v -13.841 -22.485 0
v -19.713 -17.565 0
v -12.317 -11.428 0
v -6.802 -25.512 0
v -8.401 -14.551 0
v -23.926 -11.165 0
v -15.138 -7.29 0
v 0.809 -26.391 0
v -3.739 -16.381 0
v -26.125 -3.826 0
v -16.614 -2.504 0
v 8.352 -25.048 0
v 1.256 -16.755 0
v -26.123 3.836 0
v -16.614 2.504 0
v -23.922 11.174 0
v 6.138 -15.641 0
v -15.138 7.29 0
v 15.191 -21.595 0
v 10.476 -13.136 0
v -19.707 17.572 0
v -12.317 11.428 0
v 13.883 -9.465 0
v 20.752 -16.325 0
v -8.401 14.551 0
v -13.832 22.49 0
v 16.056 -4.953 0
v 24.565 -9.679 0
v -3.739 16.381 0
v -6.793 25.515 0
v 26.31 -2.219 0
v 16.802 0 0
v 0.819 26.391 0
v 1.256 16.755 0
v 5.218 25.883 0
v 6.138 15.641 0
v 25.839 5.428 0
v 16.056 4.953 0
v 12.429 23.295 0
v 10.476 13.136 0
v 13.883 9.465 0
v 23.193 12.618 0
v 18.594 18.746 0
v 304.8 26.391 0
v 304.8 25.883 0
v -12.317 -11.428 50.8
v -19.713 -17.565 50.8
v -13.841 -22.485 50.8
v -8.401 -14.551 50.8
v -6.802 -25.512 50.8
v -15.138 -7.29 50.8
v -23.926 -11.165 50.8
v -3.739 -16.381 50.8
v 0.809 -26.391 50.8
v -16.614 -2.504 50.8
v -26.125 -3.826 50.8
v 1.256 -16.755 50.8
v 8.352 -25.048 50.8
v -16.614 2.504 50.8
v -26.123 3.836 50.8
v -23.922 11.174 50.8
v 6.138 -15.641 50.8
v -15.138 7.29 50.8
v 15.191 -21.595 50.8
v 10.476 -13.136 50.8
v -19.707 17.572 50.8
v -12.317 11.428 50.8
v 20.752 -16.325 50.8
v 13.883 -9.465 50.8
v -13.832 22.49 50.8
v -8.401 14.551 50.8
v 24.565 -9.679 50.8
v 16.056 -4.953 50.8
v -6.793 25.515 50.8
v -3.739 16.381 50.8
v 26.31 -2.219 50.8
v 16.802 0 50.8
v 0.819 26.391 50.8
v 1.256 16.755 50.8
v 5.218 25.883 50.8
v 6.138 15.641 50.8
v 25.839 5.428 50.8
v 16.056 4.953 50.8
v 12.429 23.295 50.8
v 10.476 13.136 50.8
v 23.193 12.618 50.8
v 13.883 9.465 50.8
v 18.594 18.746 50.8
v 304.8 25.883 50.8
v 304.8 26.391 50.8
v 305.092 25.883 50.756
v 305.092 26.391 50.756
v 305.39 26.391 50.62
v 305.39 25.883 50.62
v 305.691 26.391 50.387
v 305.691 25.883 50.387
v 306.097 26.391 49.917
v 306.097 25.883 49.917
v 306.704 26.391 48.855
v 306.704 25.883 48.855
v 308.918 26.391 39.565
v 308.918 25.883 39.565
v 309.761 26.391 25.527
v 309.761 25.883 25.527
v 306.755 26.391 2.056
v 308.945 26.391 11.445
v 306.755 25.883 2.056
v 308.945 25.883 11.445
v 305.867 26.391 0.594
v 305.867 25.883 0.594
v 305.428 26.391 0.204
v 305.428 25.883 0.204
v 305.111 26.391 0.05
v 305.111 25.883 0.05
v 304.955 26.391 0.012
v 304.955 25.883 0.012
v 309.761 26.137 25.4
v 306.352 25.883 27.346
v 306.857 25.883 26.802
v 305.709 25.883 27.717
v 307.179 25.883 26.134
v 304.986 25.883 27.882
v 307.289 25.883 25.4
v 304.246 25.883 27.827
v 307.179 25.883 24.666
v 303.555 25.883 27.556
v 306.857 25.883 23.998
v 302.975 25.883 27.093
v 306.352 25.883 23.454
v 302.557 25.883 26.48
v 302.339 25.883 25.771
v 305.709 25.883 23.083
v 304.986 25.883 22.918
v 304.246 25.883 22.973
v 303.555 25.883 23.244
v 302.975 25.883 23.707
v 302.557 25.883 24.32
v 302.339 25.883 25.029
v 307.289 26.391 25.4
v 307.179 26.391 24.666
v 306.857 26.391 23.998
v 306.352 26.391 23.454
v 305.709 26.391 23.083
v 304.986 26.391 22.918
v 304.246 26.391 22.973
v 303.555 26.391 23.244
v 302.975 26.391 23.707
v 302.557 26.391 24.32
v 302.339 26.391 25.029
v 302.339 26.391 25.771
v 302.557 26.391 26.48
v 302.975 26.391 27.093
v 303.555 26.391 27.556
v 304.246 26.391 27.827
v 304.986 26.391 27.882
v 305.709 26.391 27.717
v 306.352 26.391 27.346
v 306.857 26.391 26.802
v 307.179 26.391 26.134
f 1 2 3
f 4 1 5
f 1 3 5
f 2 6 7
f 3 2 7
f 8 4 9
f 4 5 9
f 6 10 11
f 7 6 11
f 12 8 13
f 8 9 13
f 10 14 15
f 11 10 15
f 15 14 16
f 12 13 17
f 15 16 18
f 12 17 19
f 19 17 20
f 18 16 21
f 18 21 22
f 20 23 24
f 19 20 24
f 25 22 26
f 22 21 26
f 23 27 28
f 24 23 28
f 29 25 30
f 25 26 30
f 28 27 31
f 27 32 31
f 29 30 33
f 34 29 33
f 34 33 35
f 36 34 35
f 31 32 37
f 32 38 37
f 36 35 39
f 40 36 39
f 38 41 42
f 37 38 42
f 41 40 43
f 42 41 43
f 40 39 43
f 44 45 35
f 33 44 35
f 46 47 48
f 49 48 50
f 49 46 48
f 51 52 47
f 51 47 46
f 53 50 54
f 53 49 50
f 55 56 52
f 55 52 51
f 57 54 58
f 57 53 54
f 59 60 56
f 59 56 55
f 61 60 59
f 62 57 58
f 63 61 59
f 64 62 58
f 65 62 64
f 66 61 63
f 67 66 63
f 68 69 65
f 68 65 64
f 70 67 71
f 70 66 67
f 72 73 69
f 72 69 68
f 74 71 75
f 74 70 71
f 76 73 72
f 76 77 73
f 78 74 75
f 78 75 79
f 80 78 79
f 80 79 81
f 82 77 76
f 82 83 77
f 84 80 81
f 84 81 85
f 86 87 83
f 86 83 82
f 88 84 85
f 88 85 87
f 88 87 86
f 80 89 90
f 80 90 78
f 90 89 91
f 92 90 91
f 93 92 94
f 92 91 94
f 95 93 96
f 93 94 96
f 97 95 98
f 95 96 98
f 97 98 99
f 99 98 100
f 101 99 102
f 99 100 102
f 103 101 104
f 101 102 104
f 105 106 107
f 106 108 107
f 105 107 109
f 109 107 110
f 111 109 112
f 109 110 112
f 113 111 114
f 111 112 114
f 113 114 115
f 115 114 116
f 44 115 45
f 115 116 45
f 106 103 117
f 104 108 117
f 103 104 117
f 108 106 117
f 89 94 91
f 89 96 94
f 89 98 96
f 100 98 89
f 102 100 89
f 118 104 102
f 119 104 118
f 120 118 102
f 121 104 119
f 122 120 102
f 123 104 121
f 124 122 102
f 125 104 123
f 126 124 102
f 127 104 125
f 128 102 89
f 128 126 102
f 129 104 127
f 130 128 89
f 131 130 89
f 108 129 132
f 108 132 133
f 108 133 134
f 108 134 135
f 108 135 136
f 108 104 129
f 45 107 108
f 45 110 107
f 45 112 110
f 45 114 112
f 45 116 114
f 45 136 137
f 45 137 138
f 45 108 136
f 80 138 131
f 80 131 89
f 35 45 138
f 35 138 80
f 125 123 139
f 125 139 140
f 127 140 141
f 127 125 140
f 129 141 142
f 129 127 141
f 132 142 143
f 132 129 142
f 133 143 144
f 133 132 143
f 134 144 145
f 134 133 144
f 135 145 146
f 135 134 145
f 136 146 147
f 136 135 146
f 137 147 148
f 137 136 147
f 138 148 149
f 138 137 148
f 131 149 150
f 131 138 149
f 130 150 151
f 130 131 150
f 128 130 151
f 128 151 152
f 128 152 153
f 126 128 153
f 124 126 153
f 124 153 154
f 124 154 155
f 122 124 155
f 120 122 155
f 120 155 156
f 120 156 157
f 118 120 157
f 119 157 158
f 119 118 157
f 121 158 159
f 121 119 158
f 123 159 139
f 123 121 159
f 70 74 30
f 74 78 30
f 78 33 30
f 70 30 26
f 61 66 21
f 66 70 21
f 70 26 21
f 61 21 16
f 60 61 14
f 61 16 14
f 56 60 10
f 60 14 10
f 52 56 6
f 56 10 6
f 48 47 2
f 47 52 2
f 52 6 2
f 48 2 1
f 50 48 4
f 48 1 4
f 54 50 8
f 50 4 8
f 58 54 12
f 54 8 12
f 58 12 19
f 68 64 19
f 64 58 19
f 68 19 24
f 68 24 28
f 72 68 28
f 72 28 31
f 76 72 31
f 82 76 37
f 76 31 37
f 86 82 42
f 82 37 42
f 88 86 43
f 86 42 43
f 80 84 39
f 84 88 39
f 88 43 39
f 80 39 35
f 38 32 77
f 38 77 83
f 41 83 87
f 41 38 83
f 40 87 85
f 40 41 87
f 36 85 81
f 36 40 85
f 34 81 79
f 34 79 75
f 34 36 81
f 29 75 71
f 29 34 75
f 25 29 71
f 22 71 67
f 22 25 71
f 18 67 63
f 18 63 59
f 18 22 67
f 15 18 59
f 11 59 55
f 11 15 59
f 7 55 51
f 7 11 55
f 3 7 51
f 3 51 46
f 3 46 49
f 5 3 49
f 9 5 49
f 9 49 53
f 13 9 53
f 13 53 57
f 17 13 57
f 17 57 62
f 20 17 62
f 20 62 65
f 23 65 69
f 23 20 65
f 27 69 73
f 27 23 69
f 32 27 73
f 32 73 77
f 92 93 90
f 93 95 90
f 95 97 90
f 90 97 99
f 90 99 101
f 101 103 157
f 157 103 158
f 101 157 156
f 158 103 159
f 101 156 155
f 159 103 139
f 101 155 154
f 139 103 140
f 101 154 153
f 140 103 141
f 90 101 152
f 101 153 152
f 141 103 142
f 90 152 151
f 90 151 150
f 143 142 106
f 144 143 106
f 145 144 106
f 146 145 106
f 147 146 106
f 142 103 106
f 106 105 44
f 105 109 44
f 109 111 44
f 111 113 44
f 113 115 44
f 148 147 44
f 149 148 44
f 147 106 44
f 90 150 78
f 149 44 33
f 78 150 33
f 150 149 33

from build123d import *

# Parameters (mm, degrees)
SKETCH1_R           = 26.4033
SKETCH1_R_2         = 16.8021
BOSS_EXTRUDE1_DEPTH = 50.8
SKETCH2_R           = 2.4892
BOSS_EXTRUDE2_DEPTH = 0.508


with BuildPart() as part:
    # Sketch1 → Boss-Extrude1 (new body)
    with BuildSketch(Plane.XY):
        Circle(SKETCH1_R)
        Circle(SKETCH1_R_2, mode=Mode.SUBTRACT)
    extrude(amount=BOSS_EXTRUDE1_DEPTH)

    # Sketch2 → Boss-Extrude2 (add)
    with BuildSketch(Plane(origin=(0, 25.8826, 0), x_dir=(1, 0, 0), z_dir=(0, 1, 0))):
        with BuildLine():
            Line((0, -50.8), (0, 0))
            Line((0, 0), (304.8, 0))
            add(Edge.make_bspline(
                [(304.8, -50.8), (309.760765967, -50.8), (309.760765967, -25.4), (309.760765967, 0), (304.8, 0)],
                knots=[3.141592654, 3.141592654, 3.141592654, 4.71238898, 4.71238898, 6.283185307, 6.283185307, 6.283185307], degree=2, weights=[1, 0.707106781, 1, 0.707106781, 1]))
            Line((304.8, -50.8), (0, -50.8))
        make_face()
        with Locations((304.8, -25.4)):
            Circle(SKETCH2_R, mode=Mode.SUBTRACT)
    extrude(amount=BOSS_EXTRUDE2_DEPTH)


solid = part.part
